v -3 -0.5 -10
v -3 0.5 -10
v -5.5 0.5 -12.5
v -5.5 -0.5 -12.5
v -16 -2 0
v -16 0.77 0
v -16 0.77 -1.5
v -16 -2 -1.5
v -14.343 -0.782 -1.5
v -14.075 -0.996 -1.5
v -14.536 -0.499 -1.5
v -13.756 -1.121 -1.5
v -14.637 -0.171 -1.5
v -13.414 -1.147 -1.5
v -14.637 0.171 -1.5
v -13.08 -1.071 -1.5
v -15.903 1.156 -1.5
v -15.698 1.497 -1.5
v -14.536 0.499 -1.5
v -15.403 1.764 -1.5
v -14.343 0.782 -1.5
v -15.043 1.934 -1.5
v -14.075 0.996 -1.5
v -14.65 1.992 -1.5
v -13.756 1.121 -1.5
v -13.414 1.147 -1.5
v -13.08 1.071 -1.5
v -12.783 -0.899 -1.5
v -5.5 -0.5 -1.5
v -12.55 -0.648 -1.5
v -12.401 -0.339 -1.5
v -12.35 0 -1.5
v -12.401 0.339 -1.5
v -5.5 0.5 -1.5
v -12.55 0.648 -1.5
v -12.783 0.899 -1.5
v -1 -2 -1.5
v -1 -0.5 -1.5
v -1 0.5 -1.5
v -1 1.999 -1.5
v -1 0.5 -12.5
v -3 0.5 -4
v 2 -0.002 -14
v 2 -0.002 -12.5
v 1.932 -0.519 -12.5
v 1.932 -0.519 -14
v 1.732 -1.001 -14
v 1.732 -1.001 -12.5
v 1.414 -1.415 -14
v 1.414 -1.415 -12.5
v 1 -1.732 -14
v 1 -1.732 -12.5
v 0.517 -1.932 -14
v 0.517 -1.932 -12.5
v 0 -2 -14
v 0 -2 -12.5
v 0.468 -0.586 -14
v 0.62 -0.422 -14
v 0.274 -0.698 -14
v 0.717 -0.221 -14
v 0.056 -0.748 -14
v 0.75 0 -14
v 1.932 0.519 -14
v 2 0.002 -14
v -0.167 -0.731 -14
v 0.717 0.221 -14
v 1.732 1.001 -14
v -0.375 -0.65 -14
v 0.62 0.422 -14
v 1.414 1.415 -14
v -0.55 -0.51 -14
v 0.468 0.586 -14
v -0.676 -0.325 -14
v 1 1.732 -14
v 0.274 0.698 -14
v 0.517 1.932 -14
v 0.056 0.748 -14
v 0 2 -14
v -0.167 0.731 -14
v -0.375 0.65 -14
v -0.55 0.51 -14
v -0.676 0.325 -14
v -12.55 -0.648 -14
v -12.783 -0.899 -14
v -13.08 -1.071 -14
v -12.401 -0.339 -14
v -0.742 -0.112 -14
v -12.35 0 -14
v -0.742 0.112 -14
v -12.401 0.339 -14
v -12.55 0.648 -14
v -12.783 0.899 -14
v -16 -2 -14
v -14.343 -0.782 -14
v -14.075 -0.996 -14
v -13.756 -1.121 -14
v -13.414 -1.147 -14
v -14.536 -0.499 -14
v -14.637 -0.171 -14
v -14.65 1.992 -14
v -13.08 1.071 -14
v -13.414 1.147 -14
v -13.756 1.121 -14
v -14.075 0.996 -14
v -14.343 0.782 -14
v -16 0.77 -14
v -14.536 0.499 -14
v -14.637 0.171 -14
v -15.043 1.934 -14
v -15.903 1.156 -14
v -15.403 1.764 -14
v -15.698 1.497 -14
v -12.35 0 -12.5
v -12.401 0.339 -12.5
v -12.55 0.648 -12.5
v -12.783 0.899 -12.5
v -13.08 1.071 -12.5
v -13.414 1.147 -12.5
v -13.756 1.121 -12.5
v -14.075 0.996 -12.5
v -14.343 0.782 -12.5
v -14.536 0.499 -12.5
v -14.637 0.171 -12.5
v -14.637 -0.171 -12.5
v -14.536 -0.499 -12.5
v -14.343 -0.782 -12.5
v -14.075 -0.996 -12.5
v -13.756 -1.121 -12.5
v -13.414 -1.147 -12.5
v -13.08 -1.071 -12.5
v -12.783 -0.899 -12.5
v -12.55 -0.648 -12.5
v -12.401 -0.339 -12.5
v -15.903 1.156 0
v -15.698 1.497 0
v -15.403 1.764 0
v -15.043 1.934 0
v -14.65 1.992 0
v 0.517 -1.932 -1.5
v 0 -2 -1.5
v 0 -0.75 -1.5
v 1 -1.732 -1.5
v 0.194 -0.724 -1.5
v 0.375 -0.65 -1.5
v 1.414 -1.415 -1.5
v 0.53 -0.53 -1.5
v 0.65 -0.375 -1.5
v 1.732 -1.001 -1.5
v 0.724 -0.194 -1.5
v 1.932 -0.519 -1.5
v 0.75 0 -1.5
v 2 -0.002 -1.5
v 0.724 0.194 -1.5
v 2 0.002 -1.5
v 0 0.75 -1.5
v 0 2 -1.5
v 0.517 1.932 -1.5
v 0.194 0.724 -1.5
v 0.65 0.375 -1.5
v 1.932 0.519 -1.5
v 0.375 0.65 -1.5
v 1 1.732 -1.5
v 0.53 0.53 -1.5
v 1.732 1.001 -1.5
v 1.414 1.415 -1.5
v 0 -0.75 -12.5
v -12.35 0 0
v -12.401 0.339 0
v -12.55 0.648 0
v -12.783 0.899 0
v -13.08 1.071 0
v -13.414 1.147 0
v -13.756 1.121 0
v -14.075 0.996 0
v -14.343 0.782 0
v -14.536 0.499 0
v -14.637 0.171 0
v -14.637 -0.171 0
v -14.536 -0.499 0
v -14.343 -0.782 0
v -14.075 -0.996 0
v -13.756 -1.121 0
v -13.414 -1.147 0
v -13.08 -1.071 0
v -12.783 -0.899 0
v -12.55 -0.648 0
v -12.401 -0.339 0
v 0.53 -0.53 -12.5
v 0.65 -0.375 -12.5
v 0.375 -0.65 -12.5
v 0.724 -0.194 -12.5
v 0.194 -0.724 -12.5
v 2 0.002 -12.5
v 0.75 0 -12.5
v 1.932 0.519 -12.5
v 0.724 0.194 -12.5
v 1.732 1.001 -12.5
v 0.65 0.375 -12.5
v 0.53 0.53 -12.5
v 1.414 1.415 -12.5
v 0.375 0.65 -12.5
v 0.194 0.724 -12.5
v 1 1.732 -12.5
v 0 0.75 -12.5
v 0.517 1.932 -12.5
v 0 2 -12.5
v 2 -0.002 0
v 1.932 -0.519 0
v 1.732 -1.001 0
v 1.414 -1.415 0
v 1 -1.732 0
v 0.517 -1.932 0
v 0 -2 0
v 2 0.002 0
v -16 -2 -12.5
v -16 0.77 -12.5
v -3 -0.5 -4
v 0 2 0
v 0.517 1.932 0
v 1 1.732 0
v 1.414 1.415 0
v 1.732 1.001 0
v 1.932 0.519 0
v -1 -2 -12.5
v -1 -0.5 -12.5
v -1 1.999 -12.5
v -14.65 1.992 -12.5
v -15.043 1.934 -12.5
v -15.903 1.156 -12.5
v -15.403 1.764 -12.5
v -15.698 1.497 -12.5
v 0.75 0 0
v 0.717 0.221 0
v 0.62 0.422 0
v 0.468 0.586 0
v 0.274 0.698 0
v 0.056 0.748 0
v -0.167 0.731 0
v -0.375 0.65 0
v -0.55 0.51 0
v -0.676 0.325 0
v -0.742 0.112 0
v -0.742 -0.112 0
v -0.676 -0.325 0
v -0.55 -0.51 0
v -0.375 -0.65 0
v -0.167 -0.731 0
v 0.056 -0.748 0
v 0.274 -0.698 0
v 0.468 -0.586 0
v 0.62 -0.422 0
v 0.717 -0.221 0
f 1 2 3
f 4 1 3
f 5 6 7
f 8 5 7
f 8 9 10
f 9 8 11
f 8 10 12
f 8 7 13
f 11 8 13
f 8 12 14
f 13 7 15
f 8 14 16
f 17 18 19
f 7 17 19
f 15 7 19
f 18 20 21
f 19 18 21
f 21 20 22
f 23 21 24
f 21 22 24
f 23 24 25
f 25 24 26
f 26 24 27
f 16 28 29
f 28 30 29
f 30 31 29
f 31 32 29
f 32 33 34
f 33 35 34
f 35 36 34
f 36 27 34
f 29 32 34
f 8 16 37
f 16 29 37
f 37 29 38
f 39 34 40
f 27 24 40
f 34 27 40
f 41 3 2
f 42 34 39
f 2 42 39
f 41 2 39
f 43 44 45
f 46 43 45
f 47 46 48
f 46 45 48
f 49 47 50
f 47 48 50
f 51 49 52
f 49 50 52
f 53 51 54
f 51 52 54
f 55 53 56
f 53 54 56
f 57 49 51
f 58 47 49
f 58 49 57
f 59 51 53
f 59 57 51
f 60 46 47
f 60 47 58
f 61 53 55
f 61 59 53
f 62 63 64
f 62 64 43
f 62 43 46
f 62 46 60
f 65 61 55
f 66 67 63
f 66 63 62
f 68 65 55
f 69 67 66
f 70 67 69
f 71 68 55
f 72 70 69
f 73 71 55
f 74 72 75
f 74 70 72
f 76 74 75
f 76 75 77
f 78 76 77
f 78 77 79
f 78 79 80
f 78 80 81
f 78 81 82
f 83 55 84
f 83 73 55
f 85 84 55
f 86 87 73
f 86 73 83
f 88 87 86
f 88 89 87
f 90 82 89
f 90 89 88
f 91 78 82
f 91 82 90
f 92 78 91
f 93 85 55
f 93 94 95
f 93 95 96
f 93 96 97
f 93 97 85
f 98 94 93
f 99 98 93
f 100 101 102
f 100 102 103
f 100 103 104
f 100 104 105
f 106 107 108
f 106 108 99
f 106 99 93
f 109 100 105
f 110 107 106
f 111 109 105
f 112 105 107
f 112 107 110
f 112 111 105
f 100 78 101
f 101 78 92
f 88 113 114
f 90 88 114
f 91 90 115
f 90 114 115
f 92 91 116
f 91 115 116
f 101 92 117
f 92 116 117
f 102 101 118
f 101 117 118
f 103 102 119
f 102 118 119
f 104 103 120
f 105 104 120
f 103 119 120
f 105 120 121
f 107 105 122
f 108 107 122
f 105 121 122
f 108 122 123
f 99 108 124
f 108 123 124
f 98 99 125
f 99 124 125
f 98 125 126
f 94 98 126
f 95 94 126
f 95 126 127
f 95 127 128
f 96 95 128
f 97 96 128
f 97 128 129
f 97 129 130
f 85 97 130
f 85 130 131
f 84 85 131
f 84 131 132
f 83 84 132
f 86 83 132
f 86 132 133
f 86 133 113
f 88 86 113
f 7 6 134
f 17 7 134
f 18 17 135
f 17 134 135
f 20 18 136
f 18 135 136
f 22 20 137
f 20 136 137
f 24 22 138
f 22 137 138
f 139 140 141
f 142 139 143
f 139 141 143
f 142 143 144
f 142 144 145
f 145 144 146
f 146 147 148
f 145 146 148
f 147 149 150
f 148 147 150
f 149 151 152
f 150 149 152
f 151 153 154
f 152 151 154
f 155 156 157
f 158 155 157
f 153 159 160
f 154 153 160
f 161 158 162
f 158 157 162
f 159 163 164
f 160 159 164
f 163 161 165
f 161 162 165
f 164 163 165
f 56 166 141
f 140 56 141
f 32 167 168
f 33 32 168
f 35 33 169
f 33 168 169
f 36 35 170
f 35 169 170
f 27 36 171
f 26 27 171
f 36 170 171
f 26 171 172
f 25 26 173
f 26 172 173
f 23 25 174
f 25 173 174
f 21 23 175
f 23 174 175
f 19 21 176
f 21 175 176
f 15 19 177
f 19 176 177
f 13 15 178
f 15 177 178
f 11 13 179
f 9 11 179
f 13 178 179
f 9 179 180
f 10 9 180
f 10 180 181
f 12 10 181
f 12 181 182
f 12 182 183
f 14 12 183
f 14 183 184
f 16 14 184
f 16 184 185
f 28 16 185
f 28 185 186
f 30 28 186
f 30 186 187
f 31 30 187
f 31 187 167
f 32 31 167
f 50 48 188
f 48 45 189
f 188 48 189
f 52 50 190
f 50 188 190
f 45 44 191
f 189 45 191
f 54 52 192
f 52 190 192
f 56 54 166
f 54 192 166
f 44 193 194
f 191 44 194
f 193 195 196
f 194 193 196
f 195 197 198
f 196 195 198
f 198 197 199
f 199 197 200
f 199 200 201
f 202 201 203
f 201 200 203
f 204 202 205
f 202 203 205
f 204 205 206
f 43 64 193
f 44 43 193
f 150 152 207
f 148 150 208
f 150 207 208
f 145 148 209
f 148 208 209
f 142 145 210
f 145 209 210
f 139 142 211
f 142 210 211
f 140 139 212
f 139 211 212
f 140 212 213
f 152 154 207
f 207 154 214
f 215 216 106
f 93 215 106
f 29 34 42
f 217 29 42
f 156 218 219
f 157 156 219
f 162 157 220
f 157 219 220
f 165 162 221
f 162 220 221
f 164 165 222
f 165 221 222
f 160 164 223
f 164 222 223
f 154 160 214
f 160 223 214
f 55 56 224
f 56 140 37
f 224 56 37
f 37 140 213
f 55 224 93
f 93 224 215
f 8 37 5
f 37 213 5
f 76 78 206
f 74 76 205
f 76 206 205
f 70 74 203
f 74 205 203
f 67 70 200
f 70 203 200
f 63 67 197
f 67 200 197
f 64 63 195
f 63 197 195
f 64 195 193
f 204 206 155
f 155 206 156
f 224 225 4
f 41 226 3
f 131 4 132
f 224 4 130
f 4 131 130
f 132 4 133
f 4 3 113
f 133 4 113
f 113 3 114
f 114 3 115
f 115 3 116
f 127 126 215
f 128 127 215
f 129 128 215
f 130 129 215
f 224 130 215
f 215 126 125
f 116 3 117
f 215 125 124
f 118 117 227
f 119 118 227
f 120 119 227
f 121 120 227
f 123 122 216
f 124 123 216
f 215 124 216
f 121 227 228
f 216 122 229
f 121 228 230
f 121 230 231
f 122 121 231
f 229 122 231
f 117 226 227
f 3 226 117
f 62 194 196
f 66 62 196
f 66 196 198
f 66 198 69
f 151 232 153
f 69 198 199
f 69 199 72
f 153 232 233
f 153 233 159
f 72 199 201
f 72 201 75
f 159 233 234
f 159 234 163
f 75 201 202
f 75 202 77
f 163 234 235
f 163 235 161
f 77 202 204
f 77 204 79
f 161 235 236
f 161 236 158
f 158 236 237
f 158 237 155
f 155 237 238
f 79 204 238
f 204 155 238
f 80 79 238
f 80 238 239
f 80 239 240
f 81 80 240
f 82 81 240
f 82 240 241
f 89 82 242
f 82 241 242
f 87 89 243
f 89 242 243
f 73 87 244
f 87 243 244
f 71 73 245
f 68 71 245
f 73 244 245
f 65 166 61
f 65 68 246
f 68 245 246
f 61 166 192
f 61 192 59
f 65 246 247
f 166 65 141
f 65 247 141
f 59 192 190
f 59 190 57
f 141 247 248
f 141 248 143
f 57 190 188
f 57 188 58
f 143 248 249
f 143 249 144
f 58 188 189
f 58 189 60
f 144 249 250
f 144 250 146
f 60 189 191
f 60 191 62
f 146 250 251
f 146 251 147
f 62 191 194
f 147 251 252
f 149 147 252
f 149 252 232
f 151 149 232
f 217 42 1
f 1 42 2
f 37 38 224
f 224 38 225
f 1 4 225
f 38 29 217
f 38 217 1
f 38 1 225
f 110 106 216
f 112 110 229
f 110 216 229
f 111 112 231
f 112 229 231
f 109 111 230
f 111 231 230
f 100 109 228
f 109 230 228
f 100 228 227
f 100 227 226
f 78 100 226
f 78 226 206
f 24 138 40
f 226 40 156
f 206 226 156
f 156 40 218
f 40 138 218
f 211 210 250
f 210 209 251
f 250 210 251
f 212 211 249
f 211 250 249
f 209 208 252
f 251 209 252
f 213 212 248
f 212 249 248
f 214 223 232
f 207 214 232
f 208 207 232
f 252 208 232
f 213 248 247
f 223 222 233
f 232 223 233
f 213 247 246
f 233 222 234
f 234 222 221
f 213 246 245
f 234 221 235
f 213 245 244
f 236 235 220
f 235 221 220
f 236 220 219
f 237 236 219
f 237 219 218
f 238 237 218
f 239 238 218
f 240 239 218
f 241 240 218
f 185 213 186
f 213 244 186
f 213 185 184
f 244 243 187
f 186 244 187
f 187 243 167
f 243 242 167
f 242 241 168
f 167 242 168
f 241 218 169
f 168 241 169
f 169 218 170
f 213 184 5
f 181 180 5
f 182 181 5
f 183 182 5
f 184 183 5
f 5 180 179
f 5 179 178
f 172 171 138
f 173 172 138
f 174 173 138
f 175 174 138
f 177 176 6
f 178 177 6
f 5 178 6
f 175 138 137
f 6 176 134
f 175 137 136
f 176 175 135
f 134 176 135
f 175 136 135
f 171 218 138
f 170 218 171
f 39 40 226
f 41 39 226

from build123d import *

# Parameters (mm, degrees)
SKETCH5_R           = 1.15
SKETCH5_R_2         = 0.749999784
BASE_EXTRUDE_DEPTH  = 14.000000432
SKETCH9_OUTSIDE_W   = 24.639
SKETCH9_OUTSIDE_H   = 20.632
CUT_EXTRUDE2_DEPTH  = 37.000000432
BOSS_EXTRUDE1_DEPTH = 1.000000047


with BuildPart() as part:
    # Sketch5 → Base-Extrude (new body)
    with BuildSketch(Plane.XY):
        with BuildLine():
            Line((-14.650000216, 1.992481203), (-2.16e-07, 2.000000047))
            ThreePointArc((-2.16e-07, 2.000000047), (2.000000047, 1.08e-07), (0, -2.000000047))
            Line((0, -2.000000047), (-15.999999829, -2.000000047))
            Line((-15.999999829, -2.000000047), (-15.999999829, 0.500000071))
            ThreePointArc((-15.999999829, 0.500000071), (-15.656001468, 1.545642629), (-14.650000216, 1.992481203))
        make_face()
        with Locations((-13.500000216, 4.7e-08)):
            Circle(SKETCH5_R, mode=Mode.SUBTRACT)
        Circle(SKETCH5_R_2, mode=Mode.SUBTRACT)
    extrude(amount=-BASE_EXTRUDE_DEPTH)

    # Sketch9 outside → Cut-Extrude2 (cut)
    with BuildSketch(Plane(origin=(0, 17.539650086, 0), x_dir=(-1, 0, 0), z_dir=(0, 1, 0))):
        with Locations((7.0035, -7)):
            Rectangle(SKETCH9_OUTSIDE_W, SKETCH9_OUTSIDE_H)
        Polygon((5.500000203, -12.500000186), (15.999999829, -12.500000186), (15.999999829, -14.000000432), (-1.999999397, -14.000000432), (-1.999999397, -12.500000186), (0, -12.500000186), (0, -1.500000246), (-1.999999397, -1.500000246), (-1.999999397, 0), (15.999999829, 0), (15.999999829, -1.500000246), (5.500000203, -1.500000246), (1.000000164, -1.500000246), (1.000000164, -12.500000186), align=None, mode=Mode.SUBTRACT)
    extrude(amount=-CUT_EXTRUDE2_DEPTH, mode=Mode.SUBTRACT)

    # Sketch10 → Boss-Extrude1 (add)
    with BuildSketch(Plane(origin=(-42.928367292, 0.500000071, -4.00000019), x_dir=(-1, 0, 0), z_dir=(0, 1, 0))):
        Polygon((-37.428367089, 2.499999944), (-39.928367266, 0), (-39.928367266, -6.000000052), (-37.428367089, -8.499999996), (-41.928367128, -8.499999996), (-41.928367128, 2.499999944), align=None)
    extrude(amount=-BOSS_EXTRUDE1_DEPTH)


solid = part.part
